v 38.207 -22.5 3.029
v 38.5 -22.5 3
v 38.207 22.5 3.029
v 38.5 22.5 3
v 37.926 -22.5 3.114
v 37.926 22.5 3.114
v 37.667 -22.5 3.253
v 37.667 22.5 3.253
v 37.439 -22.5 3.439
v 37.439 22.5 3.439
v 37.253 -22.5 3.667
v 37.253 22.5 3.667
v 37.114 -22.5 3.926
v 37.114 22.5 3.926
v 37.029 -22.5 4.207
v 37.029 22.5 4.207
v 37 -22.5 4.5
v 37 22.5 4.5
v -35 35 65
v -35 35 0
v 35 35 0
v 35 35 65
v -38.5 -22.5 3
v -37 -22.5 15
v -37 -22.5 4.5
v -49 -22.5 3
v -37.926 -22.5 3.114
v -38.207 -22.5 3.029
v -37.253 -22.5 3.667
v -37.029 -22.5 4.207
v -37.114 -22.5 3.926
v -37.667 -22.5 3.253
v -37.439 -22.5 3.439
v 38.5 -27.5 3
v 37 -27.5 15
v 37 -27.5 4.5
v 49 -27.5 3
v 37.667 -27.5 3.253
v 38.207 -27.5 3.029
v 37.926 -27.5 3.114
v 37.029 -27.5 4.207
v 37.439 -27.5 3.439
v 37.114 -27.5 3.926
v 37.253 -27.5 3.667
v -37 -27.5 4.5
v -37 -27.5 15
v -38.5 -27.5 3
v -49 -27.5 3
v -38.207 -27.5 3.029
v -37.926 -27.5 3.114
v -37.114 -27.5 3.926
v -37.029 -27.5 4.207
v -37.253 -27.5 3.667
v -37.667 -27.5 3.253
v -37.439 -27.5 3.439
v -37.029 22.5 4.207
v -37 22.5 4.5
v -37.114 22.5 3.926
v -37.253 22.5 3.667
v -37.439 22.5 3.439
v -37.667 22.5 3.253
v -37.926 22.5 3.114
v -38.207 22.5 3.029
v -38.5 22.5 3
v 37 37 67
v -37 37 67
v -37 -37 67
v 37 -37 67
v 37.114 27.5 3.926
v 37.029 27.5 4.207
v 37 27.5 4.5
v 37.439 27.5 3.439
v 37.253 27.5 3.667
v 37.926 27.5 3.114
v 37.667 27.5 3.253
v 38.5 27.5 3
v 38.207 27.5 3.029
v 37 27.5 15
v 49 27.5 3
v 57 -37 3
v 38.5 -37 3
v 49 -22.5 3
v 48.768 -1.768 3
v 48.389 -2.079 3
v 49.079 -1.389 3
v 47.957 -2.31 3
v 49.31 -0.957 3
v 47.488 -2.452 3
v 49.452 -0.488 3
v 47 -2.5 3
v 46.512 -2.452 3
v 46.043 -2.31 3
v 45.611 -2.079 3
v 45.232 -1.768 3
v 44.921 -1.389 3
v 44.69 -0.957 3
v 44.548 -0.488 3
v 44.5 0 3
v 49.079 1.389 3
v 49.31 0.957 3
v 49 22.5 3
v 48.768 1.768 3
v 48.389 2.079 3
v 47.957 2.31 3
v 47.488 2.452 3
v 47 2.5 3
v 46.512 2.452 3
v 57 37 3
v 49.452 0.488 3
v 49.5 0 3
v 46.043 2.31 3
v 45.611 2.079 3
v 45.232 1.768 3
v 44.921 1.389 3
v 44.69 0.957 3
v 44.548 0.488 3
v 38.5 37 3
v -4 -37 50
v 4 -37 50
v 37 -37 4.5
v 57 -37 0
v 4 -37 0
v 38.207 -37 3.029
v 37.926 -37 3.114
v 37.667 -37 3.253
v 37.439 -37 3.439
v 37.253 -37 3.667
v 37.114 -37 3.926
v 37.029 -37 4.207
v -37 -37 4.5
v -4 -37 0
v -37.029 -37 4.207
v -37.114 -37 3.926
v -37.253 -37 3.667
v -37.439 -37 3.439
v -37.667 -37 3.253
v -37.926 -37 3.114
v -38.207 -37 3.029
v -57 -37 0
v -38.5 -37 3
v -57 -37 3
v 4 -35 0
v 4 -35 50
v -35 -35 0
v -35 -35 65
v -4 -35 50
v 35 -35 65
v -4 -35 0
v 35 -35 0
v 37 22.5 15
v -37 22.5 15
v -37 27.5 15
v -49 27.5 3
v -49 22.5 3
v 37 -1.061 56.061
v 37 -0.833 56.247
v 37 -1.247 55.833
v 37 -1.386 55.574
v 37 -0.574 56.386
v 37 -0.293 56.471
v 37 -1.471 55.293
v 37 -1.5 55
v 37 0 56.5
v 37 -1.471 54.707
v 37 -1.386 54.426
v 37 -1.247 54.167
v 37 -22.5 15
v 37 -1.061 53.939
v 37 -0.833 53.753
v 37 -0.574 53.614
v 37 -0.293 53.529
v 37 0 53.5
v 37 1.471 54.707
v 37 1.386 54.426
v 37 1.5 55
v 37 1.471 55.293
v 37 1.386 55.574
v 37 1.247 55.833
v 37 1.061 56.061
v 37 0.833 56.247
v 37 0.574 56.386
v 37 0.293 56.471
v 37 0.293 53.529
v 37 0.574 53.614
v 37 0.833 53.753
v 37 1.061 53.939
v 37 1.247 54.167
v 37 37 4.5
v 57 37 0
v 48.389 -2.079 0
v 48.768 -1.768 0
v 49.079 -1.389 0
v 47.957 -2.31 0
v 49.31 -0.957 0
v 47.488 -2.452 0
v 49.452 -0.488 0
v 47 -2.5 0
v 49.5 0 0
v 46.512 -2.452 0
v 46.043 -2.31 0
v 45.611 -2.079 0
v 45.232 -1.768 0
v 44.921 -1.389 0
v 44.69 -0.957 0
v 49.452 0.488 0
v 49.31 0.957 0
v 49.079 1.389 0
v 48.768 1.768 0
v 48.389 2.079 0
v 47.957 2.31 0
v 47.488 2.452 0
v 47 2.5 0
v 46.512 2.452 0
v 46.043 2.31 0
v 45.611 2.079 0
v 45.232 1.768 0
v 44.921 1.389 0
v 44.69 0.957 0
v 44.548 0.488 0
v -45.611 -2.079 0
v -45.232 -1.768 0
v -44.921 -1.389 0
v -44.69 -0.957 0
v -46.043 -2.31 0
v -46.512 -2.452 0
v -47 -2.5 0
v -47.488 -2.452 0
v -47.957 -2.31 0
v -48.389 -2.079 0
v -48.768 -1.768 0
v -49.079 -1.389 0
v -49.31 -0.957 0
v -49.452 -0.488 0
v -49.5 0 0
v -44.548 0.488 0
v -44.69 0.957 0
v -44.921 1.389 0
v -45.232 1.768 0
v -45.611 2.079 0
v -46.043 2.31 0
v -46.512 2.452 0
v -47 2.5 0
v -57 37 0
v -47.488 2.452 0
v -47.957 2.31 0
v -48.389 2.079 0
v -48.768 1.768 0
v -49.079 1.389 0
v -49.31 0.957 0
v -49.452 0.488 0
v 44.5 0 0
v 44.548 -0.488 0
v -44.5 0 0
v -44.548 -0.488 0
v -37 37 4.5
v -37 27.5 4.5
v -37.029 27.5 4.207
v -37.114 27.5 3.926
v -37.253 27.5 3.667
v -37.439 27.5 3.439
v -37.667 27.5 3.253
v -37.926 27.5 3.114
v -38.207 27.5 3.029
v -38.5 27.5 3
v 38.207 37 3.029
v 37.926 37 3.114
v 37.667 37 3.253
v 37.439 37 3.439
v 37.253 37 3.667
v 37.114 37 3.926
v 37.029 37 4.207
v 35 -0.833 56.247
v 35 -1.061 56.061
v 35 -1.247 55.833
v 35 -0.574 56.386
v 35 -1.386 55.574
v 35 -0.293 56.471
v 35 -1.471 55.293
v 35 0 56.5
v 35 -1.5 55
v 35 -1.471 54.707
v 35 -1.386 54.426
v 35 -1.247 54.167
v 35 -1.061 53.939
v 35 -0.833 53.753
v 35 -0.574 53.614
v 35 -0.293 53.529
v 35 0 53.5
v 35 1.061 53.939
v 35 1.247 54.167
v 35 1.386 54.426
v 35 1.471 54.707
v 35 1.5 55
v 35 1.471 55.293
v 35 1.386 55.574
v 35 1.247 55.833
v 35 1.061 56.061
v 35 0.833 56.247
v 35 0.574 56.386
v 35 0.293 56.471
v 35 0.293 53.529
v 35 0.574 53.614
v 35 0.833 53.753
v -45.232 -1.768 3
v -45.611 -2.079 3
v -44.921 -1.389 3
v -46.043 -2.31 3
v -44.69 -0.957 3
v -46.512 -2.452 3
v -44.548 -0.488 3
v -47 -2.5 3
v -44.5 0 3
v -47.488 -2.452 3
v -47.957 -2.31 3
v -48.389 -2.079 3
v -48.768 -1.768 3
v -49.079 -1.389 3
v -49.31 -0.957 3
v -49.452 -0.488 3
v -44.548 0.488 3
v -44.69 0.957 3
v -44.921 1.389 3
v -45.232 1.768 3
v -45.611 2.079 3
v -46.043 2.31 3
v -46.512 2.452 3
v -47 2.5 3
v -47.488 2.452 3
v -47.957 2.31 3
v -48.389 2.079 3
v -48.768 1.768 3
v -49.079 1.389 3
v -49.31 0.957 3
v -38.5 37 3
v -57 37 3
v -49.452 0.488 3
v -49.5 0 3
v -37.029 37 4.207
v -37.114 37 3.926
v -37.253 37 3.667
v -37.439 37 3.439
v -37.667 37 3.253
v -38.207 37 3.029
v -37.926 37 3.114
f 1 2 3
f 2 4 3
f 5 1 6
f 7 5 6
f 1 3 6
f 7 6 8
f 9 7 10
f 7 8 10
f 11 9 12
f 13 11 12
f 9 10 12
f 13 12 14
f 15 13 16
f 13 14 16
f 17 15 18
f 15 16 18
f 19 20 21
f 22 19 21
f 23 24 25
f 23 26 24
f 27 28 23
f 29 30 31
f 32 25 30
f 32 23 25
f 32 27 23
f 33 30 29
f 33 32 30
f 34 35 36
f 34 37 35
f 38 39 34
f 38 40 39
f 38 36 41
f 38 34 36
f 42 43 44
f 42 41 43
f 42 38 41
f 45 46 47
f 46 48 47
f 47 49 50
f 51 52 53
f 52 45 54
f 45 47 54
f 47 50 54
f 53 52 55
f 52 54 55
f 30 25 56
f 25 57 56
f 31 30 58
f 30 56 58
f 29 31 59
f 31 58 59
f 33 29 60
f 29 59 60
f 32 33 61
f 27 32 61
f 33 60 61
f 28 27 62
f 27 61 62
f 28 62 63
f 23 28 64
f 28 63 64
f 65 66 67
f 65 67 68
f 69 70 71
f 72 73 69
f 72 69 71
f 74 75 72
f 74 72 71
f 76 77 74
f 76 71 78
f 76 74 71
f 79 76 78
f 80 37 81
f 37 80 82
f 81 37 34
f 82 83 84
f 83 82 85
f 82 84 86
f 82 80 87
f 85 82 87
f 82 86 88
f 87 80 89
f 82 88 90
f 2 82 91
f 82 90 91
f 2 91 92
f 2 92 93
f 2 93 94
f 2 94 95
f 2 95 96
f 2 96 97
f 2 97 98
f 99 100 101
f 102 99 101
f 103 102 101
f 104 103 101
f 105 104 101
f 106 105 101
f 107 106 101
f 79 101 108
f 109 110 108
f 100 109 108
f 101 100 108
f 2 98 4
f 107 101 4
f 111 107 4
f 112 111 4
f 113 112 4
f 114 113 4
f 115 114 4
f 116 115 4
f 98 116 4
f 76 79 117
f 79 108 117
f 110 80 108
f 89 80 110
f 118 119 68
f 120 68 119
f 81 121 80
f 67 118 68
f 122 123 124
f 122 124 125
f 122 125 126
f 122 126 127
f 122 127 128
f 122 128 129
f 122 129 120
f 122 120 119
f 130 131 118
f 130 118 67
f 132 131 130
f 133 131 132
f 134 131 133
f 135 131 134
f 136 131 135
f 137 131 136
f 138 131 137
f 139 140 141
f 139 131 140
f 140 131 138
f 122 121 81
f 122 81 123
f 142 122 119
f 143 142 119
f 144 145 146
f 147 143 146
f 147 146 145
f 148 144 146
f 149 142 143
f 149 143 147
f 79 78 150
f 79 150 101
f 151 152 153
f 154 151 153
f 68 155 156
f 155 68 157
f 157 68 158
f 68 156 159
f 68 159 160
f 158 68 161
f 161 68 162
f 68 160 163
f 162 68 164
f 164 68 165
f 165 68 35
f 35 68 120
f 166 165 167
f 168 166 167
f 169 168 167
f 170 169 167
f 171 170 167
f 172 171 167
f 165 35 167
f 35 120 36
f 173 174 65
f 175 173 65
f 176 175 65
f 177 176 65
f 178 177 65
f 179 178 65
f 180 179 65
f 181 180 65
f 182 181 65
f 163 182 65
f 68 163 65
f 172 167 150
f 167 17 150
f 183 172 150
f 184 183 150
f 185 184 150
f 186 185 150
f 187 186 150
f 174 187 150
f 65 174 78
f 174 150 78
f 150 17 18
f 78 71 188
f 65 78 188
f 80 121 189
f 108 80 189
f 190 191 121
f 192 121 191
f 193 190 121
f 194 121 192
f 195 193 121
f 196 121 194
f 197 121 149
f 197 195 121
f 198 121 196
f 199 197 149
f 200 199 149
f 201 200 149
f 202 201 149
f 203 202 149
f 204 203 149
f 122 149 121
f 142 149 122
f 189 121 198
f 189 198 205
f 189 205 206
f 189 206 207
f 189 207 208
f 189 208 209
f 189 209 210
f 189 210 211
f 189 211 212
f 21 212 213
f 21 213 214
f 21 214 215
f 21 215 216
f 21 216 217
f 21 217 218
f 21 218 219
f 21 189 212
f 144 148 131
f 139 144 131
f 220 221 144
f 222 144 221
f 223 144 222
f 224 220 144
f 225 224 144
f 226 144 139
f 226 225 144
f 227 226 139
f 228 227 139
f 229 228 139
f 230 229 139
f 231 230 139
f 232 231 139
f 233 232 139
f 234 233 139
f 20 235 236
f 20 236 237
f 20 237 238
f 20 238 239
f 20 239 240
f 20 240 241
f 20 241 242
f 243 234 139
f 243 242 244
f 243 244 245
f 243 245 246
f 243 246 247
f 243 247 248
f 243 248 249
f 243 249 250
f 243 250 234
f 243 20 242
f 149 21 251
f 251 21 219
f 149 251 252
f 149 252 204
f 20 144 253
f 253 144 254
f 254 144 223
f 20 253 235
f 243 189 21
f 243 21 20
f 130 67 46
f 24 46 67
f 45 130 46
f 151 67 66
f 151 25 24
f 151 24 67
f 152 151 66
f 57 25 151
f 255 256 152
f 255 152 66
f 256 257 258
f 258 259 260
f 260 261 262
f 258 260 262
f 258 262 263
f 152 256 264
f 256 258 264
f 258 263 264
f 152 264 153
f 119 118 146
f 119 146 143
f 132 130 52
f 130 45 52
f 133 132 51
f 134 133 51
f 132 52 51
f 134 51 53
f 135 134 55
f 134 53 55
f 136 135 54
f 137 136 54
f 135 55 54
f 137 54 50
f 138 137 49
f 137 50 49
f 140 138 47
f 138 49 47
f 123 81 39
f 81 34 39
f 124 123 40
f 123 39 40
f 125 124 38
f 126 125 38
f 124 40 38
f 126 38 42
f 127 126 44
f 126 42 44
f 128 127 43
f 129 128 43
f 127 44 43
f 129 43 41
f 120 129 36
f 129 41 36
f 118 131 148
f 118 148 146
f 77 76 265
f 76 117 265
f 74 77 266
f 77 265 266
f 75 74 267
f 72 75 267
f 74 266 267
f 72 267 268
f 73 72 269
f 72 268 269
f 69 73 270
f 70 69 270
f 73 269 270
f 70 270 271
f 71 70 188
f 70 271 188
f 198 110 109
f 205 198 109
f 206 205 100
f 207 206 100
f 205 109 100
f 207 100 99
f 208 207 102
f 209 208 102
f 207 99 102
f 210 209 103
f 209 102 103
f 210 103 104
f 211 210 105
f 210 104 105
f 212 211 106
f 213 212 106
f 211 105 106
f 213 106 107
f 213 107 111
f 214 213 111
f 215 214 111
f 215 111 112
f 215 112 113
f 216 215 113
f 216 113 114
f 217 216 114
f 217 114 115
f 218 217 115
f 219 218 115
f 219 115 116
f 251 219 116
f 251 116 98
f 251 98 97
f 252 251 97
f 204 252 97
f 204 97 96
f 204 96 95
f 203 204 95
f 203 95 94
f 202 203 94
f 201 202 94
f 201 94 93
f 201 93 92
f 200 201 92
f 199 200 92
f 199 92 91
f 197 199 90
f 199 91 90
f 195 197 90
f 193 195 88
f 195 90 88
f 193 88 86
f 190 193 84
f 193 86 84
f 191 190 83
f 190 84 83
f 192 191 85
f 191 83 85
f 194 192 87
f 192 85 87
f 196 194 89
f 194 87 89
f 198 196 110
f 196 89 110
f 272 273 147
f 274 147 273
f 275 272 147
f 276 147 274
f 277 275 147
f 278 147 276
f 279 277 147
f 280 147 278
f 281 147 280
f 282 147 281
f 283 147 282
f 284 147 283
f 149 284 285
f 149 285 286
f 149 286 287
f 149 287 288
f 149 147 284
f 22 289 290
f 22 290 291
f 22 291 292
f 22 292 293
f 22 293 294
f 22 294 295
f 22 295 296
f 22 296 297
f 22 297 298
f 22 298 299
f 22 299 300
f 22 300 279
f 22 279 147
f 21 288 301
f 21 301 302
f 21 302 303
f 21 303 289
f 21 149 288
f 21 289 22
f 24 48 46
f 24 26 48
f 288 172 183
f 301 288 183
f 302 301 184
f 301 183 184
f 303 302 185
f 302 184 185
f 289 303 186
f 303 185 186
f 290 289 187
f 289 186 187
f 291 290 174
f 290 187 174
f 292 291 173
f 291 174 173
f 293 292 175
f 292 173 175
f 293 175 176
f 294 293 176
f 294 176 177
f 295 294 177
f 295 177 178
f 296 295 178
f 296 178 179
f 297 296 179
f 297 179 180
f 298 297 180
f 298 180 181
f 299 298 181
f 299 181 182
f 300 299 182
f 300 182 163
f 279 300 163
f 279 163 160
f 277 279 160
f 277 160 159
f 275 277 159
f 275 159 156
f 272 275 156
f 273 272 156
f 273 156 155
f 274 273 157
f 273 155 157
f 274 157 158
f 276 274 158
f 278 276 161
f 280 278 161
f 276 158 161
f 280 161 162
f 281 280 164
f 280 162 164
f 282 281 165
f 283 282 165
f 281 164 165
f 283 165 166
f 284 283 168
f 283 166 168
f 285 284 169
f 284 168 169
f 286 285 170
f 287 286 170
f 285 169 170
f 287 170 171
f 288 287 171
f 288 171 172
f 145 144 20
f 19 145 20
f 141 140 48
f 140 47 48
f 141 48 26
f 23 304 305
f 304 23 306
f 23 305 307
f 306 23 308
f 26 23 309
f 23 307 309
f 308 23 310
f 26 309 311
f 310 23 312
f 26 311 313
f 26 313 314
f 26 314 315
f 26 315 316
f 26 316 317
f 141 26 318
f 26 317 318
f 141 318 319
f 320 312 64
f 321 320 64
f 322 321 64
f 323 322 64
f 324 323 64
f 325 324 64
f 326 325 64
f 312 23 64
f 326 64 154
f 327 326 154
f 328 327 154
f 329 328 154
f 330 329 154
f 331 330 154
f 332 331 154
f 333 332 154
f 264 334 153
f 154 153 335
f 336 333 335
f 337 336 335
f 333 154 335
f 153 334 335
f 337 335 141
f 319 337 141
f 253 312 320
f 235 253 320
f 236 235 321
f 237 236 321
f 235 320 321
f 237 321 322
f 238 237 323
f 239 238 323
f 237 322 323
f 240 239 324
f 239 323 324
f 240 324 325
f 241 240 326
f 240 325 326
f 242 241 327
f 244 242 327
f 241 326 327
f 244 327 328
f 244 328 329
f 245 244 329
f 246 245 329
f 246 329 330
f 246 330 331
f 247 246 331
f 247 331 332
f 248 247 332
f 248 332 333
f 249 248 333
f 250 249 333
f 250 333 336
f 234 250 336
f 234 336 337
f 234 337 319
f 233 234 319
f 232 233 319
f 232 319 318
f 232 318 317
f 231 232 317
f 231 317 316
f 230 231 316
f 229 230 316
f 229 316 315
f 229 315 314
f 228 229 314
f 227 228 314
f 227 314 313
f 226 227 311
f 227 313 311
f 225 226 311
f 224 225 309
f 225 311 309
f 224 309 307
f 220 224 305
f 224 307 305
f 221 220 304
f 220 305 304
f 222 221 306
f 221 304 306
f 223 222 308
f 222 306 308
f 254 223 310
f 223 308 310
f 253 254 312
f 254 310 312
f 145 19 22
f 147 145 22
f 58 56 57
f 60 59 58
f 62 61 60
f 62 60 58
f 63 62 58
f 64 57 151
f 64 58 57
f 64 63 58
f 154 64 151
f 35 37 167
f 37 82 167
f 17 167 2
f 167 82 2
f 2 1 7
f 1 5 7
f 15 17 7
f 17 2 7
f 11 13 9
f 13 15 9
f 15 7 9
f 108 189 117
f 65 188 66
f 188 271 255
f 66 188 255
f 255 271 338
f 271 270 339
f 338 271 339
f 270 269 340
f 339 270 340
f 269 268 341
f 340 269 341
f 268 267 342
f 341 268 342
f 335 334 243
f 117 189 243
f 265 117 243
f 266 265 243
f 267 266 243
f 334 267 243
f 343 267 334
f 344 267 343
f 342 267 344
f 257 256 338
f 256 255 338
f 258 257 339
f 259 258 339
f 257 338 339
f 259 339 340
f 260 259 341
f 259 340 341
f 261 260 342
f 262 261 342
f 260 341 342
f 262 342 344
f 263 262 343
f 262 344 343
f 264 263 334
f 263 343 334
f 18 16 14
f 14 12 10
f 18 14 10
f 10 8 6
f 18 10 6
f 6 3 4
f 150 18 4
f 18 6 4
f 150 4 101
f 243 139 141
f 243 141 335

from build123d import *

# Parameters (mm, degrees)
SKETCH_1_W          = 74
SKETCH_1_H          = 74
SKETCH_1_W_2        = 70
SKETCH_1_H_2        = 70
EXTRUDE_1_DEPTH     = 65
SKETCH_2_W          = 74
SKETCH_2_H          = 74
EXTRUDE_2_DEPTH     = 2
SKETCH_3_W          = 20
SKETCH_3_H          = 74
EXTRUDE_3_DEPTH     = 3
EXTRUDE_4_DEPTH     = 2.5
EXTRUDE_5_DEPTH     = 2.5
SKETCH_6_R          = 2.5
CUT_EXTRUDE_1_DEPTH = 5
FILLET_1_R          = 1.5
SKETCH_7_W          = 8
SKETCH_7_H          = 50
CUT_EXTRUDE_2_DEPTH = 5
SKETCH_9_R          = 1.5
CUT_EXTRUDE_3_DEPTH = 5


with BuildPart() as part:
    # 草图1 → 凸台-拉伸1 (new body)
    with BuildSketch(Plane.XY):
        Rectangle(SKETCH_1_W, SKETCH_1_H)
        Rectangle(SKETCH_1_W_2, SKETCH_1_H_2, mode=Mode.SUBTRACT)
    extrude(amount=EXTRUDE_1_DEPTH)

    # 草图2 → 凸台-拉伸2 (add)
    with BuildSketch(Plane.XY.offset(65)):
        Rectangle(SKETCH_2_W, SKETCH_2_H)
    extrude(amount=EXTRUDE_2_DEPTH)

    # 草图3 → 凸台-拉伸3 (add)
    with BuildSketch(Plane(origin=(0, 0, 0), x_dir=(-1, 0, 0), z_dir=(0, 0, -1))):
        with Locations((-47, 0)):
            Rectangle(SKETCH_3_W, SKETCH_3_H)
        with Locations((47, 0)):
            Rectangle(SKETCH_3_W, SKETCH_3_H)
    extrude(amount=-EXTRUDE_3_DEPTH)

    # 草图4 → 凸台-拉伸4 (add, symmetric)
    with BuildSketch(Plane(origin=(0, 25, 0), x_dir=(1, 0, 0), z_dir=(0, 1, 0))):
        Polygon((-37, -15), (-49, -3), (-37, -3), align=None)
    extrude_4 = extrude(amount=EXTRUDE_4_DEPTH, both=True)

    # 草图5 → 凸台-拉伸5 (add, symmetric)
    with BuildSketch(Plane(origin=(0, -25, 0), x_dir=(1, 0, 0), z_dir=(0, 1, 0))):
        Polygon((-37, -15), (-37, -3), (-49, -3), align=None)
    extrude_5 = extrude(amount=EXTRUDE_5_DEPTH, both=True)

    # 镜向1: 凸台-拉伸4, 凸台-拉伸5 across plane
    add(extrude_4.mirror(Plane(origin=(0, 0, 0), x_dir=(0, 0, 1), z_dir=(1, 0, 0))))
    add(extrude_5.mirror(Plane(origin=(0, 0, 0), x_dir=(0, 0, 1), z_dir=(1, 0, 0))))

    # 草图6 → 切除-拉伸1 (cut)
    with BuildSketch(Plane.XY.offset(3)):
        with Locations((47, 0)):
            Circle(SKETCH_6_R)
        with Locations((-47, 0)):
            Circle(SKETCH_6_R)
    extrude(amount=-CUT_EXTRUDE_1_DEPTH, mode=Mode.SUBTRACT)

    # 圆角1
    fillet_1_edges = [part.edges().sort_by_distance(p)[0] for p in [
        (37, 0, 3),
        (-37, 32.25, 3),
        (37, -32.25, 3),
        (-37, 0, 3),
        (-37, -32.25, 3),
        (37, 32.25, 3),
    ]]
    fillet(fillet_1_edges, radius=FILLET_1_R)

    # 草图7 → 切除-拉伸2 (cut)
    with BuildSketch(Plane.XZ.offset(37)):
        with Locations((0, 25)):
            Rectangle(SKETCH_7_W, SKETCH_7_H)
    extrude(amount=-CUT_EXTRUDE_2_DEPTH, mode=Mode.SUBTRACT)

    # 草图9 → 切除-拉伸3 (cut)
    with BuildSketch(Plane(origin=(37, 0, 0), x_dir=(0, 0, -1), z_dir=(1, 0, 0))):
        with Locations((-55, 0)):
            Circle(SKETCH_9_R)
    extrude(amount=-CUT_EXTRUDE_3_DEPTH, mode=Mode.SUBTRACT)


solid = part.part
